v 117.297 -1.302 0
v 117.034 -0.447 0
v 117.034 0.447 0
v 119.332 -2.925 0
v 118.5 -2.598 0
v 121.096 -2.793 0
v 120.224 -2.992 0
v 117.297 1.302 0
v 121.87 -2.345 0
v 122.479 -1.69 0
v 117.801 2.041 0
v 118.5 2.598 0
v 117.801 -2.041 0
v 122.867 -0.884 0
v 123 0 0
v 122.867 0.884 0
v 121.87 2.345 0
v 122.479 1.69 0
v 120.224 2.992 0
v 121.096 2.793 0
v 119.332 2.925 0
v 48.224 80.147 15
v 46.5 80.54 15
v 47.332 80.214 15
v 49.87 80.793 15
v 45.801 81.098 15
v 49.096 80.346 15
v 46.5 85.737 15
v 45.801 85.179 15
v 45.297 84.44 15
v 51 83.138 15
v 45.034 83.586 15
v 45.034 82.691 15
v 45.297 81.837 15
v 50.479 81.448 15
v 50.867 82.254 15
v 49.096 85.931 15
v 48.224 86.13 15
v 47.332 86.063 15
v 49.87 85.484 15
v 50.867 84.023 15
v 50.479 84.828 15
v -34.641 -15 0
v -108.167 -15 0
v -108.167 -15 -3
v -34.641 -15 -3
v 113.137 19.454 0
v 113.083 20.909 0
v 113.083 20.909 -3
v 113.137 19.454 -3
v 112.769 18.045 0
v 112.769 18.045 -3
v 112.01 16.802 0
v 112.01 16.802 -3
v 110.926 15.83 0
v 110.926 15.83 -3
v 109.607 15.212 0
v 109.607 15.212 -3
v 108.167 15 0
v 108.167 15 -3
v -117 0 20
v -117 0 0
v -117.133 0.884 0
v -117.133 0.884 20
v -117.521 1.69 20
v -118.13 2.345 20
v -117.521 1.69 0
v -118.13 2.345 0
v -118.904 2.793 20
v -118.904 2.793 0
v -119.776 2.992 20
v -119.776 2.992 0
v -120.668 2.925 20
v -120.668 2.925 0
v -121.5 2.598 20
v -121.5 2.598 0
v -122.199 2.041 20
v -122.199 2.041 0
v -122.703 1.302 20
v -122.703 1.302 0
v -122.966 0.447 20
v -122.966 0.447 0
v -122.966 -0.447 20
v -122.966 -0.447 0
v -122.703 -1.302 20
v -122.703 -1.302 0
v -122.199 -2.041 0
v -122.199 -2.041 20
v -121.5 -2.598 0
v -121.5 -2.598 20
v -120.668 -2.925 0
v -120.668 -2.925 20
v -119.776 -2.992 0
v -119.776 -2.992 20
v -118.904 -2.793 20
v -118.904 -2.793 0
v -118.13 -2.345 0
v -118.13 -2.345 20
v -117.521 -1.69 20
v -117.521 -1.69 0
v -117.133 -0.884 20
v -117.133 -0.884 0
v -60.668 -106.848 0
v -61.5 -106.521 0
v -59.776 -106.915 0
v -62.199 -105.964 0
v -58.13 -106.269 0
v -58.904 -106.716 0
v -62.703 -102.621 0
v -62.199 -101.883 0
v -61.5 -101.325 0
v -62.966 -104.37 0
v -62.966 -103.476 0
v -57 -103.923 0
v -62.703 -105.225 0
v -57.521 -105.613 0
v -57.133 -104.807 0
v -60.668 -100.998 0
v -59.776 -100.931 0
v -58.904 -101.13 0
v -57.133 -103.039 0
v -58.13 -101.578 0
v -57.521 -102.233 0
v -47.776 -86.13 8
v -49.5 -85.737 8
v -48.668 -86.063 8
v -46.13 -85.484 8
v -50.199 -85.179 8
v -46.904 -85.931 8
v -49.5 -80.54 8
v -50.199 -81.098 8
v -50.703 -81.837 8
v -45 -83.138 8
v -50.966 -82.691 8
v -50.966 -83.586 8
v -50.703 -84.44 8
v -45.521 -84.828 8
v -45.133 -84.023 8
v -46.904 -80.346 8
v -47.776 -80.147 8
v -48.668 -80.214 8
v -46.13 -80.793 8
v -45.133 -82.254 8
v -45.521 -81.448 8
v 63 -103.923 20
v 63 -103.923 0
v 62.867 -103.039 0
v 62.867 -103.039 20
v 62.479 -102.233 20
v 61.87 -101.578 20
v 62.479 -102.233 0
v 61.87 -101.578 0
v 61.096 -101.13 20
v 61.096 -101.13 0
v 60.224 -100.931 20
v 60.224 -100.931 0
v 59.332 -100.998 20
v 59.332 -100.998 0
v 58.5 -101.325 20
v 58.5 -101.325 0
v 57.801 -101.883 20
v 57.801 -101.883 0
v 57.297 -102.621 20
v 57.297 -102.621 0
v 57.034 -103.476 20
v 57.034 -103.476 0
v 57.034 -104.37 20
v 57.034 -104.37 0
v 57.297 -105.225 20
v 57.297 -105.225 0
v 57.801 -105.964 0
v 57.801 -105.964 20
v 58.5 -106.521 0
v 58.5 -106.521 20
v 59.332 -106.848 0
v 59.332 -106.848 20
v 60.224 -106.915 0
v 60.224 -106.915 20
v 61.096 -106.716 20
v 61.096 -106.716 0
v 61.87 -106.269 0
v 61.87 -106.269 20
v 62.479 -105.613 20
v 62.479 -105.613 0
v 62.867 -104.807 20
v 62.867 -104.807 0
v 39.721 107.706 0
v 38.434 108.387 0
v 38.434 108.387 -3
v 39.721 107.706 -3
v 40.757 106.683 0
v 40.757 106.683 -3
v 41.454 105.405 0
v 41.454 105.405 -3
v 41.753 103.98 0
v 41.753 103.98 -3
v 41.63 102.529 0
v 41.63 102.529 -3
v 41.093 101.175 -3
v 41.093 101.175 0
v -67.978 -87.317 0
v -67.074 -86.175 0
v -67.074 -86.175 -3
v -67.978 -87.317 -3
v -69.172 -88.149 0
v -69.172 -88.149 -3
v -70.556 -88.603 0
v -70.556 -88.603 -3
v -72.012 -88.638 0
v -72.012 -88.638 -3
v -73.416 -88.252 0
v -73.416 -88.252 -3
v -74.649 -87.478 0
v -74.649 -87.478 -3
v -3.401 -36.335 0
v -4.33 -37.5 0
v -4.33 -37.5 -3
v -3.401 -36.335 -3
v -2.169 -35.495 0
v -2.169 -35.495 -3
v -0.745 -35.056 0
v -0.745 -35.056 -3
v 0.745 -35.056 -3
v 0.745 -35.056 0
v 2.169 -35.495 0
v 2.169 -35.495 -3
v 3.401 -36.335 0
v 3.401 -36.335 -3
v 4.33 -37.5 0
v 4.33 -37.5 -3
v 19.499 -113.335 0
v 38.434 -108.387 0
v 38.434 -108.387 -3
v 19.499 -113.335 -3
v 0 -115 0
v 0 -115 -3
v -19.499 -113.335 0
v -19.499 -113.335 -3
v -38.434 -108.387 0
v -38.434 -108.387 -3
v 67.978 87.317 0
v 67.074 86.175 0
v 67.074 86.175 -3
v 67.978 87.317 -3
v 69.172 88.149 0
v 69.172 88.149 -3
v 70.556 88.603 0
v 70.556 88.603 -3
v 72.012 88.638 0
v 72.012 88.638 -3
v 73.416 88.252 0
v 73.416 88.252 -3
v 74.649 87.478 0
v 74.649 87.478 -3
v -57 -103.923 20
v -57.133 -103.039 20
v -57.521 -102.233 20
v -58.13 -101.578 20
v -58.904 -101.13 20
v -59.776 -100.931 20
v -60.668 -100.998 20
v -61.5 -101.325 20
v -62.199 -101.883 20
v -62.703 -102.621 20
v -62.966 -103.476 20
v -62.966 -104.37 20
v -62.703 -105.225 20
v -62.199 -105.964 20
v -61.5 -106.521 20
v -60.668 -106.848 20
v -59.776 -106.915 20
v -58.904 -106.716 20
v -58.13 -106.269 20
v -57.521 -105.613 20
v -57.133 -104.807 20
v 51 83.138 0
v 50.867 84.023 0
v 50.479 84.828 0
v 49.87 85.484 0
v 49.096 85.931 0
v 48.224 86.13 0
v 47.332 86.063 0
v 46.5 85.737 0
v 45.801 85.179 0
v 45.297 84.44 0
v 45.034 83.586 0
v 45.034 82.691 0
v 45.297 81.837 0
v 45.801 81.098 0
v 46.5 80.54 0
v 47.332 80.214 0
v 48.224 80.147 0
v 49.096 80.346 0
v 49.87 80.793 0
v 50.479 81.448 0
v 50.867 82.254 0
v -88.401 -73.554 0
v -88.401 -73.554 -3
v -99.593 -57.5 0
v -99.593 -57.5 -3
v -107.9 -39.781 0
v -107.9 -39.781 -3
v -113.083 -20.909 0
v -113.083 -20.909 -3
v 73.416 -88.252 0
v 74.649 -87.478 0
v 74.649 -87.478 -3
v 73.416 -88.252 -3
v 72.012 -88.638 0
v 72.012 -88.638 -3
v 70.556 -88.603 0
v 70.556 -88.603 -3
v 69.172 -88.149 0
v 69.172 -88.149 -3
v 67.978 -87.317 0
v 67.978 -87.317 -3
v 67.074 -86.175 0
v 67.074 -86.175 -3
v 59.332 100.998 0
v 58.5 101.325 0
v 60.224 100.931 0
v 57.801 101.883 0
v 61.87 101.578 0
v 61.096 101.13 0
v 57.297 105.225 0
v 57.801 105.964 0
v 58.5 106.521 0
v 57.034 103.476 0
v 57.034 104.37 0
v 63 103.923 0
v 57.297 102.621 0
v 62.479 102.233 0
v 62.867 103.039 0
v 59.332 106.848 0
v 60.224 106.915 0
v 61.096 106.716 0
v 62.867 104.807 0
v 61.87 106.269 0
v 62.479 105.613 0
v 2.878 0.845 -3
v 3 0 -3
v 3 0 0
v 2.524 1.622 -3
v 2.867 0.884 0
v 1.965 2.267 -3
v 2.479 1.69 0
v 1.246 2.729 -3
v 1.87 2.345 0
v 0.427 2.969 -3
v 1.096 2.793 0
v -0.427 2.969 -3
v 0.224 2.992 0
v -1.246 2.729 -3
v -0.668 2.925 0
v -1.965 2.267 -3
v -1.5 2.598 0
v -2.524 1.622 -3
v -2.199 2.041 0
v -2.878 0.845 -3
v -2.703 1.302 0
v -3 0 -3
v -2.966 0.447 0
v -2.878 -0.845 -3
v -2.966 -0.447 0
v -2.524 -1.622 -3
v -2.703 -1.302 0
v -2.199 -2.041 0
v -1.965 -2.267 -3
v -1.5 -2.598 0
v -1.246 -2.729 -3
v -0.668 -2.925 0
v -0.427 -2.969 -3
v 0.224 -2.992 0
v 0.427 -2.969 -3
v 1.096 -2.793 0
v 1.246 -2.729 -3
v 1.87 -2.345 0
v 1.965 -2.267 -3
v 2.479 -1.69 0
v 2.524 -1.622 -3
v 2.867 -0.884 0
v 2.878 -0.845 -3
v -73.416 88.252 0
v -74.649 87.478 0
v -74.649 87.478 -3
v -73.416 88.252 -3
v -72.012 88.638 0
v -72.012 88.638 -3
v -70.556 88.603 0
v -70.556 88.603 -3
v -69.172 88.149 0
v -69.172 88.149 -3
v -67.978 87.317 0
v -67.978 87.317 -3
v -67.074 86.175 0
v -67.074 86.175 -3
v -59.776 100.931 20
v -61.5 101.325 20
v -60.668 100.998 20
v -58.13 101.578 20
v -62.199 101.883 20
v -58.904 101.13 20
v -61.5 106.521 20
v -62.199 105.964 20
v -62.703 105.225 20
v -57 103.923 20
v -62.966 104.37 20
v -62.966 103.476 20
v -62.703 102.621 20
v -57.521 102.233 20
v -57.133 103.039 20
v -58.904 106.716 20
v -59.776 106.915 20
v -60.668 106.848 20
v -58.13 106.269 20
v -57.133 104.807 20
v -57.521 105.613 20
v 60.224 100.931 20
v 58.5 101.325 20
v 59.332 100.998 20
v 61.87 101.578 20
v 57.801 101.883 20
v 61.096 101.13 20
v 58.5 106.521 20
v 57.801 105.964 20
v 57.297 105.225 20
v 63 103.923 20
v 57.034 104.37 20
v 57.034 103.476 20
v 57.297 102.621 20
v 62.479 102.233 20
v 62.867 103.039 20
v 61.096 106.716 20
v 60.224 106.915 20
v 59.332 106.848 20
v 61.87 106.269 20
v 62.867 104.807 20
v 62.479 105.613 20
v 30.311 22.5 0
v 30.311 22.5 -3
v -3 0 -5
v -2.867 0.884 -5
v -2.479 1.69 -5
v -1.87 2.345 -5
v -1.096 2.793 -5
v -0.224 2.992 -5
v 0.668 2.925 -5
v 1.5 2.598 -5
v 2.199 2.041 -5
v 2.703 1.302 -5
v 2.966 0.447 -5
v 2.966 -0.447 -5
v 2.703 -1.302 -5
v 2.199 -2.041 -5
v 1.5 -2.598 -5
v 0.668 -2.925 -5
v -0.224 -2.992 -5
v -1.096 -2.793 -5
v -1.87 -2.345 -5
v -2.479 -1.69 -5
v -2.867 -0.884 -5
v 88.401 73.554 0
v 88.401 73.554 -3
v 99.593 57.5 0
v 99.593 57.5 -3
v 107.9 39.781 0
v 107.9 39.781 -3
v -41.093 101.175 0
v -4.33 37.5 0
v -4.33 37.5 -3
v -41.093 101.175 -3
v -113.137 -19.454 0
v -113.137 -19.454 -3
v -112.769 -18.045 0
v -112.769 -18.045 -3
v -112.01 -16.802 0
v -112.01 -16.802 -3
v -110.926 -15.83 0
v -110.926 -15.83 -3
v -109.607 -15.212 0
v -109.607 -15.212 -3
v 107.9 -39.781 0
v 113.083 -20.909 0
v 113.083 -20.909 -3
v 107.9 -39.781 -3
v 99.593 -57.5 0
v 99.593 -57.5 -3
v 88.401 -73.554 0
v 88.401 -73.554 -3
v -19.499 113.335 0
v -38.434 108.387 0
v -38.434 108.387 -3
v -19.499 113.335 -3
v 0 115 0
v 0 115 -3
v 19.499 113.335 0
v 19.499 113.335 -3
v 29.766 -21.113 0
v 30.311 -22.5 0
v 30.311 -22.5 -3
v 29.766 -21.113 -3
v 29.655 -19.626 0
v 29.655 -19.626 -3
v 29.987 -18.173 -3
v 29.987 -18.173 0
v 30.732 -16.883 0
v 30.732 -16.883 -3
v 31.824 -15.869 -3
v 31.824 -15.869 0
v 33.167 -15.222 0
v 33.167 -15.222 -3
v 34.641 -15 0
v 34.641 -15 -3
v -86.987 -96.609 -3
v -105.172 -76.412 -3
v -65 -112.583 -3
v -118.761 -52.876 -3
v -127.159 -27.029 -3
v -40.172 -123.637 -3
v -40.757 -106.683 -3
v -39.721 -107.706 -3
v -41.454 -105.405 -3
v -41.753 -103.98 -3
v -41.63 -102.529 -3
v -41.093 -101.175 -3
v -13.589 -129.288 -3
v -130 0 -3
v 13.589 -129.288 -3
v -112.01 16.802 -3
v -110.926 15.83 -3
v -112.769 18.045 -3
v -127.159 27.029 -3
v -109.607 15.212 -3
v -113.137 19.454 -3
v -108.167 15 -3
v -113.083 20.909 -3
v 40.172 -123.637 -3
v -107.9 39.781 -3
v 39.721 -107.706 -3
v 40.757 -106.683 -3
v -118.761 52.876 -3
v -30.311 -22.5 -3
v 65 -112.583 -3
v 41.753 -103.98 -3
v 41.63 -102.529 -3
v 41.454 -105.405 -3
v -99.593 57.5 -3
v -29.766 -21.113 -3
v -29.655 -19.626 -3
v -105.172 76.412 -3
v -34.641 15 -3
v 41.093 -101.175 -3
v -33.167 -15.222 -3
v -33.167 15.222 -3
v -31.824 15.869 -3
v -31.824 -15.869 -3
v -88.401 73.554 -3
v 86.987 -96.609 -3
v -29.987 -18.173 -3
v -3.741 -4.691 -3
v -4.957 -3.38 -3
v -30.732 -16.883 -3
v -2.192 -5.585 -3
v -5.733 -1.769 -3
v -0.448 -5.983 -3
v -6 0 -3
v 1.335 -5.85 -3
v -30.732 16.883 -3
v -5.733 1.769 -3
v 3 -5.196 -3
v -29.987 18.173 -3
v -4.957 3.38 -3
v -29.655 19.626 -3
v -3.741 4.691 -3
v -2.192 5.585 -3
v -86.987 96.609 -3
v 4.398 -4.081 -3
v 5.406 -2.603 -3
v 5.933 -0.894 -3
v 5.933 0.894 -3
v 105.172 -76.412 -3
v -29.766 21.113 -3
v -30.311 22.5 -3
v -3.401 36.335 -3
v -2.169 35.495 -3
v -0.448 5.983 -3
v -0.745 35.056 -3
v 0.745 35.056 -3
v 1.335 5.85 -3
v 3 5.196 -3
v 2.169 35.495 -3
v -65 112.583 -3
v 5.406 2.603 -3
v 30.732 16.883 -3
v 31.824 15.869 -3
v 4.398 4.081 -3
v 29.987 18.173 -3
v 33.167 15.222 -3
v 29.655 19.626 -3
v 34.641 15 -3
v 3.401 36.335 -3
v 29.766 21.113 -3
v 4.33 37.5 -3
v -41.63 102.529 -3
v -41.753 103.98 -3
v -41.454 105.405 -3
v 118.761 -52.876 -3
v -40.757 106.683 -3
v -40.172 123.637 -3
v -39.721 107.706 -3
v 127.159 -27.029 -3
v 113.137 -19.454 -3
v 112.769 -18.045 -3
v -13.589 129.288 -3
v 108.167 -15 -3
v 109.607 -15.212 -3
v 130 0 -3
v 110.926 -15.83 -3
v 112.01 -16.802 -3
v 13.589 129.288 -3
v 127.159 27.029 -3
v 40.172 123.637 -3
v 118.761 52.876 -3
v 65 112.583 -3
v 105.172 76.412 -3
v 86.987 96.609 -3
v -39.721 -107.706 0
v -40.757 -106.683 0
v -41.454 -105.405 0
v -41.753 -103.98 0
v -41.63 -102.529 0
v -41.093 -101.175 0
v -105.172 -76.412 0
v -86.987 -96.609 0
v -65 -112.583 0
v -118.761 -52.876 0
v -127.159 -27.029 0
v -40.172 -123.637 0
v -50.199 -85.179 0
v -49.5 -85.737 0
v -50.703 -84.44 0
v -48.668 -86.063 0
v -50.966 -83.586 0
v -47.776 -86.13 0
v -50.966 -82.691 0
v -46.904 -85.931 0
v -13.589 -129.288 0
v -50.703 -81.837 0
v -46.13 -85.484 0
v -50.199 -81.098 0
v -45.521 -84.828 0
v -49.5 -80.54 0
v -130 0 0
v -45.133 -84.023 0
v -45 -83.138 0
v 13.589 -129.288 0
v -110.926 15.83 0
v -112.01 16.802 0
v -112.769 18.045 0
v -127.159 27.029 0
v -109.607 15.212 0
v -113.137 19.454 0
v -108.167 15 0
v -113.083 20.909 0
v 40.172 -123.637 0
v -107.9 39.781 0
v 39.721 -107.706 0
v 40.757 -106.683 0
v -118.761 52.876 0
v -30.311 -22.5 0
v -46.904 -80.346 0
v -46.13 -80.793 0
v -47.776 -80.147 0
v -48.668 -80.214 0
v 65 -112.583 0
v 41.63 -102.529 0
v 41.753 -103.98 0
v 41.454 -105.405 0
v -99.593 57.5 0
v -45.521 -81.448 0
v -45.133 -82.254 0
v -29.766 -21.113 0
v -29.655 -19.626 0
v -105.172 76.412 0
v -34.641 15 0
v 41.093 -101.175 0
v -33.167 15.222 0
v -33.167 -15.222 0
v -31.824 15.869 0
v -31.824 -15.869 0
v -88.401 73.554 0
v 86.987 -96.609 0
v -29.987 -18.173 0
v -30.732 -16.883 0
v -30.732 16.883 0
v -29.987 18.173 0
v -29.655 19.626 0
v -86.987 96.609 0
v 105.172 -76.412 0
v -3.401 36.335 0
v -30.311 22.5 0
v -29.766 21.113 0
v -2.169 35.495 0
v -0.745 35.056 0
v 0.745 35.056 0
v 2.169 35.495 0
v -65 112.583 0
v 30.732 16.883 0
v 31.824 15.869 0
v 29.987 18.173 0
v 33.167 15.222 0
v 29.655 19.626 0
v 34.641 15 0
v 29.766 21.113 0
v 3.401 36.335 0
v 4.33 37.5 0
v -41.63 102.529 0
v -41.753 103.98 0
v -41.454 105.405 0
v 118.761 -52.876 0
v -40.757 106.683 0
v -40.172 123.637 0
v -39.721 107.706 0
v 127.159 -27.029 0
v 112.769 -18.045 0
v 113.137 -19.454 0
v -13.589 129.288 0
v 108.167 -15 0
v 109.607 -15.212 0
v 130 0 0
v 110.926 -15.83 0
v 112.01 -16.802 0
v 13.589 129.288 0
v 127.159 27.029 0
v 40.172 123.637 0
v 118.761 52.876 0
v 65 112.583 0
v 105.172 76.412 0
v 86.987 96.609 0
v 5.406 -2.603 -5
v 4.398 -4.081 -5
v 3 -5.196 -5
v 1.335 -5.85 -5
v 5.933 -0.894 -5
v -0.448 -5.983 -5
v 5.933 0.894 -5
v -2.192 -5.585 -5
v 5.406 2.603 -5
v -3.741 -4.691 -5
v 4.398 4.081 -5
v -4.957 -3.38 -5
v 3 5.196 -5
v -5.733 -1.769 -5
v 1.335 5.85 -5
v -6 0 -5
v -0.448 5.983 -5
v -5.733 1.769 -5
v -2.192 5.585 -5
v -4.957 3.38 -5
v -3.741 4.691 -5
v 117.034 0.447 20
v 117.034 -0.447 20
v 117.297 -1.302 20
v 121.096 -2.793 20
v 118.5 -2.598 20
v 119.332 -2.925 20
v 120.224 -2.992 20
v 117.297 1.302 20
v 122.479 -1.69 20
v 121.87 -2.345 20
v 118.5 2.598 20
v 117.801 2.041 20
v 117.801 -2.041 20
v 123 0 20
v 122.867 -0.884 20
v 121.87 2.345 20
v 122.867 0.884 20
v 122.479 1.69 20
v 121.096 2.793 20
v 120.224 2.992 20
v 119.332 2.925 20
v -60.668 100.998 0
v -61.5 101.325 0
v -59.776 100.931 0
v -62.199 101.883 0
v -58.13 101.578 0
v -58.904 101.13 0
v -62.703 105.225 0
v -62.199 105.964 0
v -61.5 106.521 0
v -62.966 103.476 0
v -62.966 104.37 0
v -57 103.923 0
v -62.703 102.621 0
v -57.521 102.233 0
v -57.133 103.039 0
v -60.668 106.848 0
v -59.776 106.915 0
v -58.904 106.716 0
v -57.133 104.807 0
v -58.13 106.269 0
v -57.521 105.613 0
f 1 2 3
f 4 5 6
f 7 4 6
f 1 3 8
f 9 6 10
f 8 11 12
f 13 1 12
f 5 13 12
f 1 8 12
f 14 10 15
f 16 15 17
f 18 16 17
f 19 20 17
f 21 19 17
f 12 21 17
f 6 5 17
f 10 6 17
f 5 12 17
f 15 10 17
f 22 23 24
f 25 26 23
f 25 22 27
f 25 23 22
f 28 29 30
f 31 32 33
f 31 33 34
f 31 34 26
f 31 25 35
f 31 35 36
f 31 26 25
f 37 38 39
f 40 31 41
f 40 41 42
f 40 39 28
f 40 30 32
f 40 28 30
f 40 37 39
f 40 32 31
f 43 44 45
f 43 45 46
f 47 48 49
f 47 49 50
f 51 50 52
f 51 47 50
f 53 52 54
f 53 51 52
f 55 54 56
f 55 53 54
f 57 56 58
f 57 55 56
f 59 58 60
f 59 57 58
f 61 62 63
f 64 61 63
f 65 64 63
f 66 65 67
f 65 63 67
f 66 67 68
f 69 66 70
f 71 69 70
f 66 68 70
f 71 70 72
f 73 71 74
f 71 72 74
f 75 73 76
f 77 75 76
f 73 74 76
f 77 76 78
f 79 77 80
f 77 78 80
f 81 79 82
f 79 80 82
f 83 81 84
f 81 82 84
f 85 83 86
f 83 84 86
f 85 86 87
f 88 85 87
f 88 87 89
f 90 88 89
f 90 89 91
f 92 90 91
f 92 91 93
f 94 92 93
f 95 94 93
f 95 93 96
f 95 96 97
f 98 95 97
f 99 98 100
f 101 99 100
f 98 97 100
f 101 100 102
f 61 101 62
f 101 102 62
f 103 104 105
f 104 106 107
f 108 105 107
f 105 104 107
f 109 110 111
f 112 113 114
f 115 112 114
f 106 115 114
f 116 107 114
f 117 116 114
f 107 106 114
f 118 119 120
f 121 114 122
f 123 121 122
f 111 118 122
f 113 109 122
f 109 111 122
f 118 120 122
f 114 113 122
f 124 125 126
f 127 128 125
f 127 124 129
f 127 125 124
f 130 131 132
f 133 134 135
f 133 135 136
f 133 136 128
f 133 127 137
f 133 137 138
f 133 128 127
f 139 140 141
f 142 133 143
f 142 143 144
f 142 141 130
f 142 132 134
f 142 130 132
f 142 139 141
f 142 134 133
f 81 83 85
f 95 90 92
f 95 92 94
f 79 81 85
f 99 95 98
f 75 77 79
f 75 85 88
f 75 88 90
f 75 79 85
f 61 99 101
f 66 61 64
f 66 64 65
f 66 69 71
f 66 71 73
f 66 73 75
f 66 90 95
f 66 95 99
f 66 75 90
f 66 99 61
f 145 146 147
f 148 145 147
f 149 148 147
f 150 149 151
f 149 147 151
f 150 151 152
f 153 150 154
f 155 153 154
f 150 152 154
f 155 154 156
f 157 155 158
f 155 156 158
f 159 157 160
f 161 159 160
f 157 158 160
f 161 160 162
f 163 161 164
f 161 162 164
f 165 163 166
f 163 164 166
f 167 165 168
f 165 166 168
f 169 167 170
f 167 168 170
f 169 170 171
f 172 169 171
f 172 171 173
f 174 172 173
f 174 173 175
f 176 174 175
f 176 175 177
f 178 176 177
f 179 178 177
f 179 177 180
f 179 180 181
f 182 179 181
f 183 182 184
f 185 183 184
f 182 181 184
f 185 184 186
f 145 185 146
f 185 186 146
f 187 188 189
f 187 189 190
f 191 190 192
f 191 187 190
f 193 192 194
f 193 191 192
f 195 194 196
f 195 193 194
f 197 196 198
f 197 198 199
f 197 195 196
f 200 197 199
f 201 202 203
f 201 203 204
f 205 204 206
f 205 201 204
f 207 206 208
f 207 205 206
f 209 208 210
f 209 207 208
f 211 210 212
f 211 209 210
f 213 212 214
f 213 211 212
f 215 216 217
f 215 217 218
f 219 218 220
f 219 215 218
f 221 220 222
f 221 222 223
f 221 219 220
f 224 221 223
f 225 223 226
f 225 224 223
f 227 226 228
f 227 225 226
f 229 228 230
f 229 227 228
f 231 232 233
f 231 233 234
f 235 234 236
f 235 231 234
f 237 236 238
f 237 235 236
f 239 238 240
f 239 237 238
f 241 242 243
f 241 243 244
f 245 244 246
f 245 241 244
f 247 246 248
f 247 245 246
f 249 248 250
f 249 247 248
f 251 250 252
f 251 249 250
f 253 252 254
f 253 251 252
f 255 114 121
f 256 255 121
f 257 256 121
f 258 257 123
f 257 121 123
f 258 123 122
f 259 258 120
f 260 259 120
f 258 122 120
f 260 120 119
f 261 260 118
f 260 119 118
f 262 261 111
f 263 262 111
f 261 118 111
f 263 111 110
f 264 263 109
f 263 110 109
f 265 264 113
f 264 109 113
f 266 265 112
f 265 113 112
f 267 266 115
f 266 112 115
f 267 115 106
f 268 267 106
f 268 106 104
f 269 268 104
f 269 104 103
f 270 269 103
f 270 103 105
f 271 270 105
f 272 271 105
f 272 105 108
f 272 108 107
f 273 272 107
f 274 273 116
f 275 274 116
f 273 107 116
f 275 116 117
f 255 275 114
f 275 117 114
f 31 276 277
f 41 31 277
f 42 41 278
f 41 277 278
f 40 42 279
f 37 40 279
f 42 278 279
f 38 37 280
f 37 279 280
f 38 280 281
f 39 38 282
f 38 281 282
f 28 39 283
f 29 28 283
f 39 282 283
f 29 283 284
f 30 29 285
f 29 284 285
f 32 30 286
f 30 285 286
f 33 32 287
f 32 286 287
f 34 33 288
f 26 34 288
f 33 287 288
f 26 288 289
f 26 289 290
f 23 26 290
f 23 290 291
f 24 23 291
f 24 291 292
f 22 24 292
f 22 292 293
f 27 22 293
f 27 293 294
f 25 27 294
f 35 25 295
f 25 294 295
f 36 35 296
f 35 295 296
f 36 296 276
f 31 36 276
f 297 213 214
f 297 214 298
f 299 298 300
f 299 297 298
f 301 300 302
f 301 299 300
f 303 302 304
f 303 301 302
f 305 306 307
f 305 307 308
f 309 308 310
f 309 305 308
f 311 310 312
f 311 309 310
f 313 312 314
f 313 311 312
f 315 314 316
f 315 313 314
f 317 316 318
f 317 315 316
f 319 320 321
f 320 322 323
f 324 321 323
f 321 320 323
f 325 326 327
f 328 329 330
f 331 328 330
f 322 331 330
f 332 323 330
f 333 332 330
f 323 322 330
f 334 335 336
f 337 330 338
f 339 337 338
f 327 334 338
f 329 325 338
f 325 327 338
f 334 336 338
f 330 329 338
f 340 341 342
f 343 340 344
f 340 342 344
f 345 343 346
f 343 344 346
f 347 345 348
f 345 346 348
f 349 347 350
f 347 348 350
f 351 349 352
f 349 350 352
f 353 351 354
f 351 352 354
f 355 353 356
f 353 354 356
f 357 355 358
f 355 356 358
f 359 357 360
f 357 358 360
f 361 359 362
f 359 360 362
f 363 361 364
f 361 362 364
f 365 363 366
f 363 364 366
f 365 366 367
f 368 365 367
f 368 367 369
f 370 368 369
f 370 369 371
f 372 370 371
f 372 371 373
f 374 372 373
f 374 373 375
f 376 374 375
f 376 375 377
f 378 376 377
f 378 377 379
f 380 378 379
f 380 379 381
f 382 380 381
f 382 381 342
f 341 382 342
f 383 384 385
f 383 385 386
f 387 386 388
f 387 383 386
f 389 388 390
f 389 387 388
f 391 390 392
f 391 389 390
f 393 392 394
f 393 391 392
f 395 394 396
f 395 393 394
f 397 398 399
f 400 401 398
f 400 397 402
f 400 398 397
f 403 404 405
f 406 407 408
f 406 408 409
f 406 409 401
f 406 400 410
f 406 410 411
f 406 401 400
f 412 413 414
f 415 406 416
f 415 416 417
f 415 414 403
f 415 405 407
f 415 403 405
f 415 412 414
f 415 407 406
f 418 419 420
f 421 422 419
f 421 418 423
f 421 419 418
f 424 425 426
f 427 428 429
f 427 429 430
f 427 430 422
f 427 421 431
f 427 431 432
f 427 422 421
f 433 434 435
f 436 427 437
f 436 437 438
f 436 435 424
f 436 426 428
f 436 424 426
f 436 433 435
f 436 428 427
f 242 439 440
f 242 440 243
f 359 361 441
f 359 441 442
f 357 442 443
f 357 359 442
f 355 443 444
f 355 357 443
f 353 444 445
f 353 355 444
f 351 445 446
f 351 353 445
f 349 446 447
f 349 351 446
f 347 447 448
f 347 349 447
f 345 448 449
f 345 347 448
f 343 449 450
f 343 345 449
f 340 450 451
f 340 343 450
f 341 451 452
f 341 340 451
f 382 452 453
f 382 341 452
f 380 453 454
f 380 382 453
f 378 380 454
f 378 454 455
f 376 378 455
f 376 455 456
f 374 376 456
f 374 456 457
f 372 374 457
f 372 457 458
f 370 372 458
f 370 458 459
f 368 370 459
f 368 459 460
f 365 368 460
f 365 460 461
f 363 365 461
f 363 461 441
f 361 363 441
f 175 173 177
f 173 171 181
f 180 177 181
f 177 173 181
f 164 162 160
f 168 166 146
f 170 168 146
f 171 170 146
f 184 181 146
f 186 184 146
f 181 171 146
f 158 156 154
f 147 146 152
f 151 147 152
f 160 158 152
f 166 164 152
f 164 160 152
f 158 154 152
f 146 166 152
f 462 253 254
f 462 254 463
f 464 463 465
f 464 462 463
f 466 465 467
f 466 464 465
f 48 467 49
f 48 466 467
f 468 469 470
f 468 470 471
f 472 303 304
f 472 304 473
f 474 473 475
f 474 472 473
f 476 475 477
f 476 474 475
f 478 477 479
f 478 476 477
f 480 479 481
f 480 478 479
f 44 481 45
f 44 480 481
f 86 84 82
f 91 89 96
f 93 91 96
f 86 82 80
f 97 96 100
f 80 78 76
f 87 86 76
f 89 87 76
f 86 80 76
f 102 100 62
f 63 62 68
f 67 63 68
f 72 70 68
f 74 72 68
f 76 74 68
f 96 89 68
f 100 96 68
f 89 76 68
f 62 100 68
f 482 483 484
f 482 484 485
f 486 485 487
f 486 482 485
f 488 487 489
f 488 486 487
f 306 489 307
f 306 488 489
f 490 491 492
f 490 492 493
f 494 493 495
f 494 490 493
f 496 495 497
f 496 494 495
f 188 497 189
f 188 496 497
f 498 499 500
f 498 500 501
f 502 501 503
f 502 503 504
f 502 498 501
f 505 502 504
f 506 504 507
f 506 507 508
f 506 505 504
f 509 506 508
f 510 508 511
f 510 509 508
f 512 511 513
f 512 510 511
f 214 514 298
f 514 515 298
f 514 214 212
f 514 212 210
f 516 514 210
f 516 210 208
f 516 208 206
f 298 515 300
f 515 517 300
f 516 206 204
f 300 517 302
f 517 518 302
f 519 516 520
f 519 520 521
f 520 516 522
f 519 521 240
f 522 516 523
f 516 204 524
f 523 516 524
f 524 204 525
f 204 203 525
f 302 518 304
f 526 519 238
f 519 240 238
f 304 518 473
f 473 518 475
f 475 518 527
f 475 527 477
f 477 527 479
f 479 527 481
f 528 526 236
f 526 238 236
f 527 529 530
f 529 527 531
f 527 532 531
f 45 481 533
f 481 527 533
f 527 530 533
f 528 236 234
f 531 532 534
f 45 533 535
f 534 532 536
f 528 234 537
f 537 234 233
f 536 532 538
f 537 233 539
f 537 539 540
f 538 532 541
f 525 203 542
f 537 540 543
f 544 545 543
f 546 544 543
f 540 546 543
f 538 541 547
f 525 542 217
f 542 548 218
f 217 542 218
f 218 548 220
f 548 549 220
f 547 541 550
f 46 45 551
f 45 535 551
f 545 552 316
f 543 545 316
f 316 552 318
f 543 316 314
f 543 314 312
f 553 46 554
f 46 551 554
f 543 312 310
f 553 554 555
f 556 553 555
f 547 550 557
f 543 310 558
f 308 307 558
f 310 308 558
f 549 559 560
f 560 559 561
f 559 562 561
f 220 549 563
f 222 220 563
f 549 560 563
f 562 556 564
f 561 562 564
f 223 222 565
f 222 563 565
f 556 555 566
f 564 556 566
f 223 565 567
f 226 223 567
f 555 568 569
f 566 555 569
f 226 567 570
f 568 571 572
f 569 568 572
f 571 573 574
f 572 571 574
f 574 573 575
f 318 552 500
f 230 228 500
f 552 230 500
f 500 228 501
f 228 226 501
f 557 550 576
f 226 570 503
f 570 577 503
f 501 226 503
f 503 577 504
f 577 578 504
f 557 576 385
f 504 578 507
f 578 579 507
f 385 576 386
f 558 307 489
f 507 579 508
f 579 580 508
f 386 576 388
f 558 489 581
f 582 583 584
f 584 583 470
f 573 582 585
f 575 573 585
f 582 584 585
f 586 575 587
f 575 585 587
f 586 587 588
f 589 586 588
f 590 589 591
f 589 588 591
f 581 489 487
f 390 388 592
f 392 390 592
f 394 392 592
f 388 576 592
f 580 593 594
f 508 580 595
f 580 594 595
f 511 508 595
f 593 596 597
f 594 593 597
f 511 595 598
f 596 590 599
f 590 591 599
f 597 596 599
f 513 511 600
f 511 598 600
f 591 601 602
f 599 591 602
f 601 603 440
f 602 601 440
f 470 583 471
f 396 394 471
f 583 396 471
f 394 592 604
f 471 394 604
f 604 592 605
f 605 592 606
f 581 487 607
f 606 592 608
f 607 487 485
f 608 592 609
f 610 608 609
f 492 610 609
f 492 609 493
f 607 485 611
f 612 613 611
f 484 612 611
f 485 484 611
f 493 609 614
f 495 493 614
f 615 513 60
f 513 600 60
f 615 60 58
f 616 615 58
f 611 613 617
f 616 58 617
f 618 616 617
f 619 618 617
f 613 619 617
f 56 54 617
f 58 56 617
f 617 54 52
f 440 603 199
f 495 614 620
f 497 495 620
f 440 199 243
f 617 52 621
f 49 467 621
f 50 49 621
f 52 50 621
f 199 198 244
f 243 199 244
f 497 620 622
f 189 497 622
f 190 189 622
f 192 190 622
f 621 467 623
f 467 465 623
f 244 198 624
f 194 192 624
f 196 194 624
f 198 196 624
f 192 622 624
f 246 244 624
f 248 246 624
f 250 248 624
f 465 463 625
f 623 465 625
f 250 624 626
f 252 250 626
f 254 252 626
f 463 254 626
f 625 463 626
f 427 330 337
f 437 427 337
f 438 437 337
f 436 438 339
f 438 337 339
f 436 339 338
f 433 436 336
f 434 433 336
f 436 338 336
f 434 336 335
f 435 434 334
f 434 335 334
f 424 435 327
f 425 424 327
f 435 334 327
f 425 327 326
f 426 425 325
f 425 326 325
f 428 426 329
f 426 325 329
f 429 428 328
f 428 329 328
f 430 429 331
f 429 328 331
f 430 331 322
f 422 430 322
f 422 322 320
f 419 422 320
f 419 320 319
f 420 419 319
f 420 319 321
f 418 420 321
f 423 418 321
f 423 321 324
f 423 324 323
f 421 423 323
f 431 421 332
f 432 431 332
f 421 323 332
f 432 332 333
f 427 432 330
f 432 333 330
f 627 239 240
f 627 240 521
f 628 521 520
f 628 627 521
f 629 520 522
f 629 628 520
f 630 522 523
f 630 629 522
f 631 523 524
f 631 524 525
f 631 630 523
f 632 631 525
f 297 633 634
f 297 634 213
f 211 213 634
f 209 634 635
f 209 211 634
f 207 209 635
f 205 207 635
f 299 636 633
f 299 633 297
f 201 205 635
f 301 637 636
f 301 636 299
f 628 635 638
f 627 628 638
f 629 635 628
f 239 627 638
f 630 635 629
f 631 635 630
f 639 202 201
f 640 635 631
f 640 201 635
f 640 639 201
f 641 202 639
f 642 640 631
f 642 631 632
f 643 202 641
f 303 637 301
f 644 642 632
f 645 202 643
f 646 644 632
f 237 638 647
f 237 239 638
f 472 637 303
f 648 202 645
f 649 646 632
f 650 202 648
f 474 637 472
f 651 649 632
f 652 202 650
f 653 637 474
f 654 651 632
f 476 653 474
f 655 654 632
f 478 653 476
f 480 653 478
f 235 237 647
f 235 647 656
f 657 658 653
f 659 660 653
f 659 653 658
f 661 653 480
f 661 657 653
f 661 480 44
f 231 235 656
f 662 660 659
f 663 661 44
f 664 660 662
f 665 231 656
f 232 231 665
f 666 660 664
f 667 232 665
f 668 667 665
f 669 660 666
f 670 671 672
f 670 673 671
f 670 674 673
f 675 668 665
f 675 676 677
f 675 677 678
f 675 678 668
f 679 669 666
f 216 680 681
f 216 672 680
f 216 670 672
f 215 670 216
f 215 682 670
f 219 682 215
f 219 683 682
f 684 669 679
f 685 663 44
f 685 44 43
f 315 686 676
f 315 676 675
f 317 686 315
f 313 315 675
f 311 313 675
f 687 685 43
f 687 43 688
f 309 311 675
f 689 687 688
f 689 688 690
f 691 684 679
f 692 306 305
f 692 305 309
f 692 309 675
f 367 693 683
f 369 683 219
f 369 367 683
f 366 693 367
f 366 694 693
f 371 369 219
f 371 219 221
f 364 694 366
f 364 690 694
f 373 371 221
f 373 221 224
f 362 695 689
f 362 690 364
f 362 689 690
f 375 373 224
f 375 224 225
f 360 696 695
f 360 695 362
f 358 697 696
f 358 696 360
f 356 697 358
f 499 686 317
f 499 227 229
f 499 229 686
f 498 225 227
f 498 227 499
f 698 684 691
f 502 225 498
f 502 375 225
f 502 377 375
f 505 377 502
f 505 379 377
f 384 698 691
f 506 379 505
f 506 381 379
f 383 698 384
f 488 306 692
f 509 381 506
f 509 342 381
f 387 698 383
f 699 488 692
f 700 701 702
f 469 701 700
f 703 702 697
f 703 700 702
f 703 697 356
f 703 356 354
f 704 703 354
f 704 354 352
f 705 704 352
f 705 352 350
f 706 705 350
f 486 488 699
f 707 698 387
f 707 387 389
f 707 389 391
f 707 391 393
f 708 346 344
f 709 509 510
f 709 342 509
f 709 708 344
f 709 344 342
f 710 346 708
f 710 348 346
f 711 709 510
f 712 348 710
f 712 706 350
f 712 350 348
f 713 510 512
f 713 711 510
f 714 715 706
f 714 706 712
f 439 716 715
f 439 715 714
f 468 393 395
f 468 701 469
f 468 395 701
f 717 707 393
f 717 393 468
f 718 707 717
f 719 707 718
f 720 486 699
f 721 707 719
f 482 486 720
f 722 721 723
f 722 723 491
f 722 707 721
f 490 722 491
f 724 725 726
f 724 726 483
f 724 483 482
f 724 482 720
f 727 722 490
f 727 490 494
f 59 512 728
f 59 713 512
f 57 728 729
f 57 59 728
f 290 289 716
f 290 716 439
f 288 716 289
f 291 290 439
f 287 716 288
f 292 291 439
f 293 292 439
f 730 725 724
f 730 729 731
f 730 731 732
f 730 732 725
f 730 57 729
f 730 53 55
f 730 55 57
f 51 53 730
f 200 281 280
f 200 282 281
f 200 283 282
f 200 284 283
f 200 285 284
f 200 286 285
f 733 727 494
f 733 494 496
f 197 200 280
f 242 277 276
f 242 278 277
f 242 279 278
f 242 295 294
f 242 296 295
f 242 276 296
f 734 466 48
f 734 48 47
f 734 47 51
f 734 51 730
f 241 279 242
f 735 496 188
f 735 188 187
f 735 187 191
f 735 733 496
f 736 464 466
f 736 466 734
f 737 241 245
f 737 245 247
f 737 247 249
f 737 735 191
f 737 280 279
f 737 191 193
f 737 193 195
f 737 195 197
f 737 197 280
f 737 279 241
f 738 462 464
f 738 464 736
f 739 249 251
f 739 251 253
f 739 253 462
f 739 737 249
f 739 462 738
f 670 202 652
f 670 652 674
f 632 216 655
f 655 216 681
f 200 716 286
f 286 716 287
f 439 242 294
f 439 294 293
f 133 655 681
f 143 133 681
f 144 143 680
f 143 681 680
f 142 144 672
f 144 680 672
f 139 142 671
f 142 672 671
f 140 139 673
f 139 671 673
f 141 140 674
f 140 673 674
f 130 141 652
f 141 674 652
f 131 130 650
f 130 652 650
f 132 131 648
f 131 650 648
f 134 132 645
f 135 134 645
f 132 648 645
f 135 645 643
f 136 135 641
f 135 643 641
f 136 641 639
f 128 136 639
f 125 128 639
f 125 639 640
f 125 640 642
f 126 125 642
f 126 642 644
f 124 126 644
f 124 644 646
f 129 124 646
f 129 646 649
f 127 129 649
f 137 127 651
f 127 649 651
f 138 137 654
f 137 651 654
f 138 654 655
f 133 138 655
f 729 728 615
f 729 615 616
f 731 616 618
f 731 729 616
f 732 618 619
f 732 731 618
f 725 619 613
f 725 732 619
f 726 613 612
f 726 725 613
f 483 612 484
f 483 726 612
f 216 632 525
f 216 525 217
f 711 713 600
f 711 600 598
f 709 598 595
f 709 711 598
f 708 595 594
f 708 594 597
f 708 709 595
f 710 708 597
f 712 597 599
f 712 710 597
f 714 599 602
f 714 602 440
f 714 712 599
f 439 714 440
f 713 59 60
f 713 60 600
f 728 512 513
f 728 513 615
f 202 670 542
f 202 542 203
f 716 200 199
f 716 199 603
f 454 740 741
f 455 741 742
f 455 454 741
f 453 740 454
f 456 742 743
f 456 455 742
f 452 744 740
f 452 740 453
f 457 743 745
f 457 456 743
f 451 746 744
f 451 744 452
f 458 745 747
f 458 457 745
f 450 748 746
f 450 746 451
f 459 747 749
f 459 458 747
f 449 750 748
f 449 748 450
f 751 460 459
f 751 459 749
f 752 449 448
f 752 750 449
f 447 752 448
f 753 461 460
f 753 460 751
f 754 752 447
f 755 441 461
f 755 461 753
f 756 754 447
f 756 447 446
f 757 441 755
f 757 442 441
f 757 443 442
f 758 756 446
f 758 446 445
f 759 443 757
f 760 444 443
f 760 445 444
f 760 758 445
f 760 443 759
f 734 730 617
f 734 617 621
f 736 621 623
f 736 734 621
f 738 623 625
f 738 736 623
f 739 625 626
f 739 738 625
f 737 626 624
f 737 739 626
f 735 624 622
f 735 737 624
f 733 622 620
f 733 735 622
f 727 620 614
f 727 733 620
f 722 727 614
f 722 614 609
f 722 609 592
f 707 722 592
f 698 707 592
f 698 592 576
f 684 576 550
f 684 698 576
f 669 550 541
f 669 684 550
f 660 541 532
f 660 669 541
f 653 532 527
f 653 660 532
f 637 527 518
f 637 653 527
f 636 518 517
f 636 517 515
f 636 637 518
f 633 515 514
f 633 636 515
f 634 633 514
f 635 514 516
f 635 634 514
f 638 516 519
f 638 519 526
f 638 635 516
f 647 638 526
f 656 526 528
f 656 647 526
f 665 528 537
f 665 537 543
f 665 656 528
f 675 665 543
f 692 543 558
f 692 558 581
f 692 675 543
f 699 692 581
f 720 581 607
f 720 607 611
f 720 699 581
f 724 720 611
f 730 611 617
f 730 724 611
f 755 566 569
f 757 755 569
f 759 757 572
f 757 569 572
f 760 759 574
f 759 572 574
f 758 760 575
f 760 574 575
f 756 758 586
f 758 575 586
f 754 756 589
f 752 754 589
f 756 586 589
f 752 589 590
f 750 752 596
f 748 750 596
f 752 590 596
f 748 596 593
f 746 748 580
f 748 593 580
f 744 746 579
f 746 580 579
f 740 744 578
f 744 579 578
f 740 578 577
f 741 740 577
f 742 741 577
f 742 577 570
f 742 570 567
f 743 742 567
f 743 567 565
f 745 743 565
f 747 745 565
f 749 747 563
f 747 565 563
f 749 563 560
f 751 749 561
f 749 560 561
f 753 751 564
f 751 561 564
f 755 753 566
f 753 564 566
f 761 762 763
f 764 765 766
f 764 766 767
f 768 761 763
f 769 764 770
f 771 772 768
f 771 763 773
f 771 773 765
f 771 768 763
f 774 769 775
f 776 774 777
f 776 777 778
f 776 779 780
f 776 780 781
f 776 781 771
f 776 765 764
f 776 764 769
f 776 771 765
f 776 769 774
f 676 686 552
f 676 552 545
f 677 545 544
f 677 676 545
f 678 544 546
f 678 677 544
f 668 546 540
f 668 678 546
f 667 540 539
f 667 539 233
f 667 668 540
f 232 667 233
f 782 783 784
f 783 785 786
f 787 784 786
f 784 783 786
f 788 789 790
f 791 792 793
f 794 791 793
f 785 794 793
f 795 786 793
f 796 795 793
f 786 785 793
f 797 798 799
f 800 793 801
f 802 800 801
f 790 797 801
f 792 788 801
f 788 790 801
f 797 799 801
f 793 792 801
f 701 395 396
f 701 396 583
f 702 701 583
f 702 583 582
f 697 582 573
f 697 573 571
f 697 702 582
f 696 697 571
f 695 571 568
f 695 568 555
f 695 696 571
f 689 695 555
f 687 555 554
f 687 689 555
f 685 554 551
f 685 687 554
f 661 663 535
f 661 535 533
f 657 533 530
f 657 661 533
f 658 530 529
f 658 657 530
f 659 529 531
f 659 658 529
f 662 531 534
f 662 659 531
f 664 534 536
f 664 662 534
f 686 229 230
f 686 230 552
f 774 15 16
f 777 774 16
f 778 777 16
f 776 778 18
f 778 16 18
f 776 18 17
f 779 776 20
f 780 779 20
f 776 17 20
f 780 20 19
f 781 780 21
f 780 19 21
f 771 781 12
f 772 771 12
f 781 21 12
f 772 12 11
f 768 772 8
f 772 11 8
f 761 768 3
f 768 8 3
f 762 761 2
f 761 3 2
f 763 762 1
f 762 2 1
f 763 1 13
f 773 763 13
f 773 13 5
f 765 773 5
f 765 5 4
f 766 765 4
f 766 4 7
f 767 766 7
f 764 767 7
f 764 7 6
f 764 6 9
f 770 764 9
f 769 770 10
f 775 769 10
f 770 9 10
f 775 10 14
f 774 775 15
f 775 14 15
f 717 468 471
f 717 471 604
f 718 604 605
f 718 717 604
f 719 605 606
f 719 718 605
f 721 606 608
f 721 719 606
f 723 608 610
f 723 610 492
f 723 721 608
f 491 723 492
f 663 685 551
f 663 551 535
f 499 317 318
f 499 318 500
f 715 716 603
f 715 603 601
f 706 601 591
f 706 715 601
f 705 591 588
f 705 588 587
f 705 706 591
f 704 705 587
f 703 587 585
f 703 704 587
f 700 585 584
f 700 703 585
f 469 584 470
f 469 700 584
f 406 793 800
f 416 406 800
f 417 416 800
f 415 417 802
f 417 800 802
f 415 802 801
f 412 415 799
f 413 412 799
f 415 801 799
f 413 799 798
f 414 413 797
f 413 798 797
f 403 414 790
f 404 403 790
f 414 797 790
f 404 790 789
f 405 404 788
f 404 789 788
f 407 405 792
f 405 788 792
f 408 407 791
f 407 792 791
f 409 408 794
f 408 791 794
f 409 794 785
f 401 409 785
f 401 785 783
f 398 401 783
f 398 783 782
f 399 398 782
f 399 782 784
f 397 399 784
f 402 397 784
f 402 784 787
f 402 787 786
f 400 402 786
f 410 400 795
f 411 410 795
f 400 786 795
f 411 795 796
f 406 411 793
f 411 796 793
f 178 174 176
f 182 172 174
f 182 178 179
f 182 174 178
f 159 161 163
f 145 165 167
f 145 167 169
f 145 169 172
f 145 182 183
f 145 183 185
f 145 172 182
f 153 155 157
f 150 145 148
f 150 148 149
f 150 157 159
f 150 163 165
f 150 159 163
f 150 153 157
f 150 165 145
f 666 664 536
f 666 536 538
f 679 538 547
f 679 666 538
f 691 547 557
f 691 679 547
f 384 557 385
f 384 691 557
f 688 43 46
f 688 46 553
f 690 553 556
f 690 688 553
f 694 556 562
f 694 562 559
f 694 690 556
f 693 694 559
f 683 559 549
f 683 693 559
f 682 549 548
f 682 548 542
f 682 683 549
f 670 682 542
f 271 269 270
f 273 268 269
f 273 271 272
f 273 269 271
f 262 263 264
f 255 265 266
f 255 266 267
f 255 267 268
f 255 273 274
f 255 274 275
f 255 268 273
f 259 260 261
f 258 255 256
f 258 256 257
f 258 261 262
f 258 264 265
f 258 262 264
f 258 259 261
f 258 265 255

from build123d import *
from build123d.topology import SkipClean

# Parameters (mm, degrees)
SKETCH_1_R          = 130
EXTRUDE_1_DEPTH     = 3
SKETCH_2_R          = 3
EXTRUDE_2_DEPTH     = 20
EXTRUDE_2_2_DEPTH   = 20
EXTRUDE_2_3_DEPTH   = 20
EXTRUDE_2_4_DEPTH   = 20
EXTRUDE_2_5_DEPTH   = 20
EXTRUDE_2_6_DEPTH   = 20
CUT_EXTRUDE_1_DEPTH = 3
SKETCH_5_R          = 3
EXTRUDE_4_DEPTH     = 8
SKETCH_6_R          = 3
EXTRUDE_5_DEPTH     = 15
SKETCH_3_R          = 3
CUT_EXTRUDE_2_DEPTH = 3
SKETCH_7_R          = 6
SKETCH_7_R_2        = 3
EXTRUDE_1_2_DEPTH   = 2


with BuildPart() as part:
    # 草图1 → Extrude 1 (new body)
    with BuildSketch(Plane.XY):
        Circle(SKETCH_1_R)
    extrude(amount=-EXTRUDE_1_DEPTH)

    # 草图4 → 切除-拉伸1 (cut)
    with BuildSketch(Plane.XY):
        with BuildLine():
            Line((-30.310889132, -22.5), (-67.073650189, -86.174969976))
            ThreePointArc((-67.073650189, -86.174969976), (-70.555983948, -88.602570466), (-74.649403444, -87.478377702))
            ThreePointArc((-74.649403444, -87.478377702), (-99.592921435, -57.5), (-113.083199094, -20.909090909))
            ThreePointArc((-113.083199094, -20.909090909), (-112.010068838, -16.801989255), (-108.166538264, -15))
            Line((-108.166538264, -15), (-34.641016151, -15))
            ThreePointArc((-34.641016151, -15), (-30.310889132, -17.5), (-30.310889132, -22.5))
        make_face()
        with BuildLine():
            Line((-34.641016151, 15), (-108.166538264, 15))
            ThreePointArc((-108.166538264, 15), (-112.010068838, 16.801989255), (-113.083199094, 20.909090909))
            ThreePointArc((-113.083199094, 20.909090909), (-99.592921435, 57.5), (-74.649403444, 87.478377702))
            ThreePointArc((-74.649403444, 87.478377702), (-70.555983948, 88.602570466), (-67.073650189, 86.174969976))
            Line((-67.073650189, 86.174969976), (-30.310889132, 22.5))
            ThreePointArc((-30.310889132, 22.5), (-30.310889132, 17.5), (-34.641016151, 15))
        make_face()
        with BuildLine():
            Line((-4.330127019, 37.5), (-41.092888075, 101.174969976))
            ThreePointArc((-41.092888075, 101.174969976), (-41.45408489, 105.404559721), (-38.43379565, 108.387468611))
            ThreePointArc((-38.43379565, 108.387468611), (0, 115), (38.43379565, 108.387468611))
            ThreePointArc((38.43379565, 108.387468611), (41.45408489, 105.404559721), (41.092888075, 101.174969976))
            Line((41.092888075, 101.174969976), (4.330127019, 37.5))
            ThreePointArc((4.330127019, 37.5), (0, 35), (-4.330127019, 37.5))
        make_face()
        with BuildLine():
            Line((30.310889132, 22.5), (67.073650189, 86.174969976))
            ThreePointArc((67.073650189, 86.174969976), (70.555983948, 88.602570466), (74.649403444, 87.478377702))
            ThreePointArc((74.649403444, 87.478377702), (99.592921435, 57.5), (113.083199094, 20.909090909))
            ThreePointArc((113.083199094, 20.909090909), (112.010068838, 16.801989255), (108.166538264, 15))
            Line((108.166538264, 15), (34.641016151, 15))
            ThreePointArc((34.641016151, 15), (30.310889132, 17.5), (30.310889132, 22.5))
        make_face()
        with BuildLine():
            Line((34.641016151, -15), (108.166538264, -15))
            ThreePointArc((108.166538264, -15), (112.010068838, -16.801989255), (113.083199094, -20.909090909))
            ThreePointArc((113.083199094, -20.909090909), (99.592921435, -57.5), (74.649403444, -87.478377702))
            ThreePointArc((74.649403444, -87.478377702), (70.555983948, -88.602570466), (67.073650189, -86.174969976))
            Line((67.073650189, -86.174969976), (30.310889132, -22.5))
            ThreePointArc((30.310889132, -22.5), (30.310889132, -17.5), (34.641016151, -15))
        make_face()
        with BuildLine():
            Line((4.330127019, -37.5), (41.092888075, -101.174969976))
            ThreePointArc((41.092888075, -101.174969976), (41.45408489, -105.404559721), (38.43379565, -108.387468611))
            ThreePointArc((38.43379565, -108.387468611), (0, -115), (-38.43379565, -108.387468611))
            ThreePointArc((-38.43379565, -108.387468611), (-41.45408489, -105.404559721), (-41.092888075, -101.174969976))
            Line((-41.092888075, -101.174969976), (-4.330127019, -37.5))
            ThreePointArc((-4.330127019, -37.5), (0, -35), (4.330127019, -37.5))
        make_face()
    extrude(amount=-CUT_EXTRUDE_1_DEPTH, mode=Mode.SUBTRACT)

    # 草图5 → 凸台-拉伸4 (add)
    with BuildSketch(Plane.XY):
        with Locations((-48, -83.138438763)):
            Circle(SKETCH_5_R)
    extrude(amount=EXTRUDE_4_DEPTH)

    # 草图6 → 凸台-拉伸5 (add)
    with BuildSketch(Plane.XY):
        with Locations((48, 83.138438763)):
            Circle(SKETCH_6_R)
    extrude(amount=EXTRUDE_5_DEPTH)

    # 草图3 → 切除-拉伸2 (cut)
    with BuildSketch(Plane.XY):
        Circle(SKETCH_3_R)
    extrude(amount=-CUT_EXTRUDE_2_DEPTH, mode=Mode.SUBTRACT)

    # 草图7 → Extrude 1 2 (add)
    with SkipClean():  # the faces are left unmerged after this step: merging them gives an invalid solid
        with BuildSketch(Plane(origin=(0, 0, -3), x_dir=(-1, 0, 0), z_dir=(0, 0, -1))):
            Circle(SKETCH_7_R)
            Circle(SKETCH_7_R_2, mode=Mode.SUBTRACT)
        extrude(amount=EXTRUDE_1_2_DEPTH)
    add(part.part.scale(1), mode=Mode.REPLACE)  # the faces are merged on a copy


with BuildPart() as body_2:
    # 草图2 → 凸台-拉伸2 (new body)
    with BuildSketch(Plane.XY):
        with Locations((-120, 0)):
            Circle(SKETCH_2_R)
    extrude(amount=EXTRUDE_2_DEPTH)


with BuildPart() as body_3:
    # 草图2 → Extrude 2 2 (new body)
    with BuildSketch(Plane.XY):
        with Locations((-60, 103.923048454)):
            Circle(SKETCH_2_R)
    extrude(amount=EXTRUDE_2_2_DEPTH)


with BuildPart() as body_4:
    # 草图2 → Extrude 2 3 (new body)
    with BuildSketch(Plane.XY):
        with Locations((60, 103.923048454)):
            Circle(SKETCH_2_R)
    extrude(amount=EXTRUDE_2_3_DEPTH)


with BuildPart() as body_5:
    # 草图2 → Extrude 2 4 (new body)
    with BuildSketch(Plane.XY):
        with Locations((120, 0)):
            Circle(SKETCH_2_R)
    extrude(amount=EXTRUDE_2_4_DEPTH)


with BuildPart() as body_6:
    # 草图2 → Extrude 2 5 (new body)
    with BuildSketch(Plane.XY):
        with Locations((60, -103.923048454)):
            Circle(SKETCH_2_R)
    extrude(amount=EXTRUDE_2_5_DEPTH)


with BuildPart() as body_7:
    # 草图2 → Extrude 2 6 (new body)
    with BuildSketch(Plane.XY):
        with Locations((-60, -103.923048454)):
            Circle(SKETCH_2_R)
    extrude(amount=EXTRUDE_2_6_DEPTH)


solid = Compound([part.part, body_2.part, body_3.part, body_4.part, body_5.part, body_6.part, body_7.part])
